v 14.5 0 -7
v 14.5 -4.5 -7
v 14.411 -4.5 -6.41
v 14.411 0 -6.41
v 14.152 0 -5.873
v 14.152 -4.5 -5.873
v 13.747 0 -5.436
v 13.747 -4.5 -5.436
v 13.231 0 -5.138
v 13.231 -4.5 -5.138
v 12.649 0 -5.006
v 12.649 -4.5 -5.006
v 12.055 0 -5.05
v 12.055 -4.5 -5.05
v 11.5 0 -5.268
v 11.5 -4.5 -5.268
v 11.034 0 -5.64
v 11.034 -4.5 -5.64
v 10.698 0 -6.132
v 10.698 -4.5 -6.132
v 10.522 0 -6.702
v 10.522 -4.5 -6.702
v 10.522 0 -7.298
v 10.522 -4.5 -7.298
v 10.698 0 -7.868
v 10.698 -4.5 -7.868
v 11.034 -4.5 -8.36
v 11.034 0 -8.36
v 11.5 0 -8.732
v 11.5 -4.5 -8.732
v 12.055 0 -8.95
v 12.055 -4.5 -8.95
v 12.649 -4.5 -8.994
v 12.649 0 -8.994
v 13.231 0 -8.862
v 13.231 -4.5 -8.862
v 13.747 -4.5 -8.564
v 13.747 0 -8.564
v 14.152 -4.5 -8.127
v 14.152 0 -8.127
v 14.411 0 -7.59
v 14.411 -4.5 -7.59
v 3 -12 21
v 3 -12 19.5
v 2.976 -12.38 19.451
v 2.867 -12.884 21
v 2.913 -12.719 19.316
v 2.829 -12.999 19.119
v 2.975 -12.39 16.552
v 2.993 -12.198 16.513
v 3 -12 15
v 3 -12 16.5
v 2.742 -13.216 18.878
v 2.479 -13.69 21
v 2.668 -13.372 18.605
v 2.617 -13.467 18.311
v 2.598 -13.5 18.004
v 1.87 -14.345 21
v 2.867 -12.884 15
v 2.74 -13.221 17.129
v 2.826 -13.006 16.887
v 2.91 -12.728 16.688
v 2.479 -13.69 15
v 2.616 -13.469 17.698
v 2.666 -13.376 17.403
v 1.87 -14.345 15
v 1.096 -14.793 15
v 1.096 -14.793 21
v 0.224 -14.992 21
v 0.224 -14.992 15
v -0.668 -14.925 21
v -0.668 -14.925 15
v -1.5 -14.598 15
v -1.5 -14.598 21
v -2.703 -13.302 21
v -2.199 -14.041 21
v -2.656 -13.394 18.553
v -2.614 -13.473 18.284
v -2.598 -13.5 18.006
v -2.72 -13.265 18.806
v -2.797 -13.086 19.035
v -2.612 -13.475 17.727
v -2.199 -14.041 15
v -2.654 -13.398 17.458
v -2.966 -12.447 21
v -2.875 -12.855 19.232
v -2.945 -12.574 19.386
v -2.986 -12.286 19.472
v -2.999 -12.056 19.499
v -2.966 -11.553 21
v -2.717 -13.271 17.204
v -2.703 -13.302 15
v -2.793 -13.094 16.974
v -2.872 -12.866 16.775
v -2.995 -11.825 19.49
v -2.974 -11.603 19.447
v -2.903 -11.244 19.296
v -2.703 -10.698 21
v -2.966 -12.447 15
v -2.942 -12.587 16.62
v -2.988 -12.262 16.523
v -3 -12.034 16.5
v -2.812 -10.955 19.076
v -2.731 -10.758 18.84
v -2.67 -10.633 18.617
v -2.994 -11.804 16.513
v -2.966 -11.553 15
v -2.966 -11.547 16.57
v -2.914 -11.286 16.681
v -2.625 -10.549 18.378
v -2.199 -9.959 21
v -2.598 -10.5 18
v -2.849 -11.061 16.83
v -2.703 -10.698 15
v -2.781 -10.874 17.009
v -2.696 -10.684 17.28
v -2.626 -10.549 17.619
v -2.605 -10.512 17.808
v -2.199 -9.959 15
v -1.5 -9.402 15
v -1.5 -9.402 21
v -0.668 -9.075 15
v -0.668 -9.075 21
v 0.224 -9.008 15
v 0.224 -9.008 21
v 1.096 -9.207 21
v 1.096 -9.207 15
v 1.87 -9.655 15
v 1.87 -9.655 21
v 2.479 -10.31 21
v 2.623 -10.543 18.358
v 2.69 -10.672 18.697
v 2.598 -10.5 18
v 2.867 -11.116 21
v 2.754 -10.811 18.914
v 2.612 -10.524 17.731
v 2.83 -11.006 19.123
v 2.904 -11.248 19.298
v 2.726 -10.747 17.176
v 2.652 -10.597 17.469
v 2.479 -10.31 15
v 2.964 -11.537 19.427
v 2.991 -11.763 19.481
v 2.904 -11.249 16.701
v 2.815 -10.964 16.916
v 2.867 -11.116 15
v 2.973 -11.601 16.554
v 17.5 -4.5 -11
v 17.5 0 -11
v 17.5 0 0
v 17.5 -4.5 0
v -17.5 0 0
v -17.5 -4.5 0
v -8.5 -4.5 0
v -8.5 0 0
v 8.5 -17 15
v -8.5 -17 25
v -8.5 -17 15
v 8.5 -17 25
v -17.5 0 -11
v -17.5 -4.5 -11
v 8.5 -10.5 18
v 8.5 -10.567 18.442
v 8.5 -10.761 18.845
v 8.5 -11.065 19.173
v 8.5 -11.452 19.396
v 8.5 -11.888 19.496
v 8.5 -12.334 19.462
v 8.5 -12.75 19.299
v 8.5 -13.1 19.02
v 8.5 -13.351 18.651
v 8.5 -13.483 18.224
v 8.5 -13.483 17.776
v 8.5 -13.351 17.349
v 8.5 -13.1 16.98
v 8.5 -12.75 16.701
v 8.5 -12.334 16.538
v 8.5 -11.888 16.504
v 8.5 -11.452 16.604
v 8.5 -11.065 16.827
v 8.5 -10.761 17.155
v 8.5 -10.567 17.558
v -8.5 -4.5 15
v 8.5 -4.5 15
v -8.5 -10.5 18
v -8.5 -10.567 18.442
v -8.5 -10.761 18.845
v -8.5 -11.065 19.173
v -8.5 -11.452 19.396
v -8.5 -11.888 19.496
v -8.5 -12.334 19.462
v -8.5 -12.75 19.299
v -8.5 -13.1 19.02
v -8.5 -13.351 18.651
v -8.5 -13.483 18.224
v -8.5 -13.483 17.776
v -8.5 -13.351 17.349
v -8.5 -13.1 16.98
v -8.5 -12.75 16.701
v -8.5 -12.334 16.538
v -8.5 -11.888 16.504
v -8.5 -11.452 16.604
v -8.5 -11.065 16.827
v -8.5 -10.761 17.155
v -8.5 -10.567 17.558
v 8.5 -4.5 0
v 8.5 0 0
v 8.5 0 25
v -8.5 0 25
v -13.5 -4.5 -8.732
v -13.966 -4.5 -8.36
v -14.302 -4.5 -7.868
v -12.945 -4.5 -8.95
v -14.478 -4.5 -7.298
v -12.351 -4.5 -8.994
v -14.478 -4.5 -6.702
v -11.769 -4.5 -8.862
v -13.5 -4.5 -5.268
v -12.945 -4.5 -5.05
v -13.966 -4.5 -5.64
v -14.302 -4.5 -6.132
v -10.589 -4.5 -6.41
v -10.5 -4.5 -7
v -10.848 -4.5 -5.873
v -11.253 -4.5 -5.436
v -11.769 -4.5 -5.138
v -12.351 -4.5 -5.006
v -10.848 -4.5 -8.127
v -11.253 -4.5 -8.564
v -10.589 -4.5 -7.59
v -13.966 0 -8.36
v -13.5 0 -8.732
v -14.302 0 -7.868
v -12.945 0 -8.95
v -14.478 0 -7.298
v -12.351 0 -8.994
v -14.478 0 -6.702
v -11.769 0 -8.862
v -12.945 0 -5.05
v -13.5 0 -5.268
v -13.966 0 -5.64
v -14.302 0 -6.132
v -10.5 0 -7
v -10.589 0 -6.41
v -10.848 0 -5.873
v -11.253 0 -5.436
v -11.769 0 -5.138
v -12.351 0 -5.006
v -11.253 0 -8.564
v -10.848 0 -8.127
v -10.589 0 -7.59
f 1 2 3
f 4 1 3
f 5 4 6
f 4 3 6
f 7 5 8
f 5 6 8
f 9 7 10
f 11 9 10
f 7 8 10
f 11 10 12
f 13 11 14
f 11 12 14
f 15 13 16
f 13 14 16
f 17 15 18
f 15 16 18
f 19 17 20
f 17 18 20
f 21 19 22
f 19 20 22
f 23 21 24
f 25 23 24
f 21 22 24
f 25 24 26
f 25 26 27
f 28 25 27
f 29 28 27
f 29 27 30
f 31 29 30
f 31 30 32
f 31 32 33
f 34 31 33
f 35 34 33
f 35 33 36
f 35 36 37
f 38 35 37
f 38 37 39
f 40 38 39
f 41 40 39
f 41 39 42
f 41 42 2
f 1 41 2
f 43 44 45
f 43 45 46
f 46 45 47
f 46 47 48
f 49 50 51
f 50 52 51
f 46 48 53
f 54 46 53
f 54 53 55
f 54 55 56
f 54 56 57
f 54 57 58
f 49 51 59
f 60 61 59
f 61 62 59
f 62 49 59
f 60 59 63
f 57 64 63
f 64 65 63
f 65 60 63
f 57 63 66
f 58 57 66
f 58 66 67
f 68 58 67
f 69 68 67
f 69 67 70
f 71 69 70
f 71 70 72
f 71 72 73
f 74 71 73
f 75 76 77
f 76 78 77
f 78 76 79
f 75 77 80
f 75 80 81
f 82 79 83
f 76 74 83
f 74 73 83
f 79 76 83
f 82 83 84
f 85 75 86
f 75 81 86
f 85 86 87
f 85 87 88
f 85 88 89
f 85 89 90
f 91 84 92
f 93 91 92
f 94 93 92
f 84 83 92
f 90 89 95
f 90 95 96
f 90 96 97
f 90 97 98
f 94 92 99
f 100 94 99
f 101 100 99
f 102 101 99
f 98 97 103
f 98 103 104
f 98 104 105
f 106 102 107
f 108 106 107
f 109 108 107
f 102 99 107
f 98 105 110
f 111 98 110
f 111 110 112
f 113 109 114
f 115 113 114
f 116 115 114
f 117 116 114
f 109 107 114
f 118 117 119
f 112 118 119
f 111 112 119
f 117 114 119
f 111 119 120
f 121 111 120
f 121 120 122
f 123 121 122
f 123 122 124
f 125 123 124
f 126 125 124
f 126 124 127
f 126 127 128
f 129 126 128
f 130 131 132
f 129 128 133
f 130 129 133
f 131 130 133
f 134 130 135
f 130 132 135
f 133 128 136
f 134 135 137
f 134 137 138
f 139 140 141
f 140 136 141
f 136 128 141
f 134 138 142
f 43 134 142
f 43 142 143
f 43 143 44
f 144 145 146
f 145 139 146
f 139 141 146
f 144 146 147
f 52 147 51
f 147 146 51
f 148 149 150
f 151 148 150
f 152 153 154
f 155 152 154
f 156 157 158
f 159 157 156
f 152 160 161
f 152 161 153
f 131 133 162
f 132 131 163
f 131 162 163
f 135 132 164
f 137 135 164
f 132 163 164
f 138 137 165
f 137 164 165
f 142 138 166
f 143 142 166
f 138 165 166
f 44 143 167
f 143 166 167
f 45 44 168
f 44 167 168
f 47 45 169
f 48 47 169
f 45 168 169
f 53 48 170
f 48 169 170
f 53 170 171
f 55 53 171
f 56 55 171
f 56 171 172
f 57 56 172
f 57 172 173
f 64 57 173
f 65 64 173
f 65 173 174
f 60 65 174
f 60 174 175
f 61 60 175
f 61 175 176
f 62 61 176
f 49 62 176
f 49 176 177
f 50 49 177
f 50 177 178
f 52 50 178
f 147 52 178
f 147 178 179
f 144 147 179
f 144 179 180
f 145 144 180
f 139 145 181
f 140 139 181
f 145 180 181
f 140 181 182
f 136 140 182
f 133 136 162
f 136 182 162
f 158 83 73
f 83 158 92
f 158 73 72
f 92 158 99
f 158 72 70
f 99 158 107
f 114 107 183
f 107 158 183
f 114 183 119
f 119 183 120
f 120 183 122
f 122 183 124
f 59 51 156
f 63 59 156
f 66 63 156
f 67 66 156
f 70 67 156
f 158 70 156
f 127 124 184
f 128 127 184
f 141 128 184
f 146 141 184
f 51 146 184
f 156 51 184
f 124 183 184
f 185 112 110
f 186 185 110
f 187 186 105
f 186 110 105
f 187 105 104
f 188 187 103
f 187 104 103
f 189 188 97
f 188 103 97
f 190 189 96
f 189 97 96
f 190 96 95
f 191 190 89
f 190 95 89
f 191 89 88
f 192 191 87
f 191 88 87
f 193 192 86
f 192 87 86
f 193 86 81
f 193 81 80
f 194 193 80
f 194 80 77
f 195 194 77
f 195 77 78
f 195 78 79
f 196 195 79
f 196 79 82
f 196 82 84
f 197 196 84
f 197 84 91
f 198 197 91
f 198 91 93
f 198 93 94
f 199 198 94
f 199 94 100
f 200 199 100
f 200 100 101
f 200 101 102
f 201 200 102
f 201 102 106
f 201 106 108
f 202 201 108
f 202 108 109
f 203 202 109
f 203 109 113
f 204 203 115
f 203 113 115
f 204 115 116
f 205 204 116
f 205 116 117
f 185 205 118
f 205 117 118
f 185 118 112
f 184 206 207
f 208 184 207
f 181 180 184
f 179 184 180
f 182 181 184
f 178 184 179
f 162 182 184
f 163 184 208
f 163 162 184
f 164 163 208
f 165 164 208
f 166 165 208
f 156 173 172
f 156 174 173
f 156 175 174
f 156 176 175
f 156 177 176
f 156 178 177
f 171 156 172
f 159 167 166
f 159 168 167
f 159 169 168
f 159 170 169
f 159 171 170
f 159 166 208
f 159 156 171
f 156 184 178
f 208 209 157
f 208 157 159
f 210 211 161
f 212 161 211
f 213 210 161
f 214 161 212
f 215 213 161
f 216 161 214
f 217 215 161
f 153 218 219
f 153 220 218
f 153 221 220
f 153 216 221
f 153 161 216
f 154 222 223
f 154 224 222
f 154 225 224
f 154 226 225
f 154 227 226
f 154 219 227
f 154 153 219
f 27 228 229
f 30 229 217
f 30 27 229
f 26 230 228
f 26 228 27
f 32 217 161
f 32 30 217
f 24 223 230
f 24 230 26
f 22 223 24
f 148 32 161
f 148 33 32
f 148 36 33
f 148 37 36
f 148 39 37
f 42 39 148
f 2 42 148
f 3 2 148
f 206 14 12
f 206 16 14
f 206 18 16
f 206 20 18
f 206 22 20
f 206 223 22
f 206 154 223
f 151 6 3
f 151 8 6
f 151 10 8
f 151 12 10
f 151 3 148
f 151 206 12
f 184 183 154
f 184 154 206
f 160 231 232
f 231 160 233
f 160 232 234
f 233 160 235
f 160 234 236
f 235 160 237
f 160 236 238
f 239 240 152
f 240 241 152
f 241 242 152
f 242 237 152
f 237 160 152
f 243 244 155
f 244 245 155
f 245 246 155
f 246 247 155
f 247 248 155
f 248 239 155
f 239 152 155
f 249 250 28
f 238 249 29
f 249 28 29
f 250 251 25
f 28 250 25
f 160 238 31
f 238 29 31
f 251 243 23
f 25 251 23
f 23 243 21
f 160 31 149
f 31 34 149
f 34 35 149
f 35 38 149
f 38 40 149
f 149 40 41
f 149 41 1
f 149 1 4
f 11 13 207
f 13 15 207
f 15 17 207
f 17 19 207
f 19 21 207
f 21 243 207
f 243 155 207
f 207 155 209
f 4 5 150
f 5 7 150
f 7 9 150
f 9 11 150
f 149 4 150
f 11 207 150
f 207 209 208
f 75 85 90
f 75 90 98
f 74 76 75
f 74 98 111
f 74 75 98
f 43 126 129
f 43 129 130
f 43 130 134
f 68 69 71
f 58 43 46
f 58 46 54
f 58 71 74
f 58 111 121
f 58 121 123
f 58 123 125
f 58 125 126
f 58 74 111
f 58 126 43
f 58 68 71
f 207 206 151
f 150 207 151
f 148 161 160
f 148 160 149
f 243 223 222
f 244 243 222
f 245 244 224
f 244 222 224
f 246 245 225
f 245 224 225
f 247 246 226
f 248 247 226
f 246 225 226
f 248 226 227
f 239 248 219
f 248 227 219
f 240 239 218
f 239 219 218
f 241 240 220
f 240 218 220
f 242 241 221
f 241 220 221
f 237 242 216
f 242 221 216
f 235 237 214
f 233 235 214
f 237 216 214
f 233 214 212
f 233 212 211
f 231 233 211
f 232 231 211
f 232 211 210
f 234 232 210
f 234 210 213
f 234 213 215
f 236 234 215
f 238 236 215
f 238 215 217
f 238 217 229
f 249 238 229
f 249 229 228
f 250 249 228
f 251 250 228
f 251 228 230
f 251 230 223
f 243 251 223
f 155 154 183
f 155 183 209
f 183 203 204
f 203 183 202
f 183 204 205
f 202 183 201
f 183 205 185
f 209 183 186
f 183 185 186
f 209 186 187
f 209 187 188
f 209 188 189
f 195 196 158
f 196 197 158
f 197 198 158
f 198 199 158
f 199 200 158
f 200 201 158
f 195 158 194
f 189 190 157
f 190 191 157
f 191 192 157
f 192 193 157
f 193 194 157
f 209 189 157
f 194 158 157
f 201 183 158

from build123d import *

# Parameters (mm, degrees)
F0_W      = 35
F0_H      = 45
F1_DEPTH  = 4.5
F2_R      = 2
F3_DEPTH  = 10
F4_W      = 35
F4_H      = 10
F5_DEPTH  = 12.5
F6_R      = 3
F7_DEPTH  = 6
F8_W      = 35
F8_H      = 4.5
F9_DEPTH  = 2
F10_W     = 9
F10_H     = 25
F11_DEPTH = 17.001
F12_R     = 1.5
F13_DEPTH = 26.001
F14_W     = 35
F14_H     = 6
F15_DEPTH = 4.501
F16_W     = 35
F16_H     = 4.5
F17_DEPTH = 1


with BuildPart() as f1:
    # F0 (on Front) → F1 (new body)
    with BuildSketch(Plane.XZ):
        with Locations((0, 2.5)):
            Rectangle(F0_W, F0_H)
    extrude(amount=F1_DEPTH)

    # F2 (on face) → F3 (cut)
    with BuildSketch(Plane.XZ.offset(4.5)):
        with Locations((12.5, -15)):
            Circle(F2_R)
        with Locations((-12.5, -15)):
            Circle(F2_R)
        with Locations((-12.5, -7)):
            Circle(F2_R)
        with Locations((12.5, -7)):
            Circle(F2_R)
    extrude(amount=-F3_DEPTH, mode=Mode.SUBTRACT)

    # F4 (on face) → F5 (join)
    with BuildSketch(Plane.XZ.offset(4.5)):
        with Locations((0, 20)):
            Rectangle(F4_W, F4_H)
    extrude(amount=F5_DEPTH)

    # F6 (on face) → F7 (cut)
    with BuildSketch(Plane(origin=(0, 0, 15), x_dir=(1, 0, 0), z_dir=(0, 0, -1))):
        with Locations((0, 12)):
            Circle(F6_R)
    extrude(amount=-F7_DEPTH, mode=Mode.SUBTRACT)

    # F8 (on face) → F9 (cut)
    with BuildSketch(Plane(origin=(0, 0, -20), x_dir=(1, 0, 0), z_dir=(0, 0, -1))):
        with Locations((0, 2.25)):
            Rectangle(F8_W, F8_H)
    extrude(amount=-F9_DEPTH, mode=Mode.SUBTRACT)

    # F10 (on face) → F11 (cut, through all)
    with BuildSketch(Plane.XZ.offset(17)):
        with Locations((-13, 12.5)):
            Rectangle(F10_W, F10_H)
        with Locations((13, 12.5)):
            Rectangle(F10_W, F10_H)
    extrude(amount=-F11_DEPTH, mode=Mode.SUBTRACT)

    # F12 (on face) → F13 (cut, through all)
    with BuildSketch(Plane.YZ.offset(8.5)):
        with Locations((-12, 18)):
            Circle(F12_R)
    extrude(amount=-F13_DEPTH, mode=Mode.SUBTRACT)

    # F14 (on face) → F15 (cut, through all)
    with BuildSketch(Plane.XZ.offset(4.5)):
        with Locations((0, -15)):
            Rectangle(F14_W, F14_H)
    extrude(amount=-F15_DEPTH, mode=Mode.SUBTRACT)

    # F16 (on face) → F17 (cut)
    with BuildSketch(Plane(origin=(0, 0, -12), x_dir=(1, 0, 0), z_dir=(0, 0, -1))):
        with Locations((0, 2.25)):
            Rectangle(F16_W, F16_H)
    extrude(amount=-F17_DEPTH, mode=Mode.SUBTRACT)


solid = f1.part
